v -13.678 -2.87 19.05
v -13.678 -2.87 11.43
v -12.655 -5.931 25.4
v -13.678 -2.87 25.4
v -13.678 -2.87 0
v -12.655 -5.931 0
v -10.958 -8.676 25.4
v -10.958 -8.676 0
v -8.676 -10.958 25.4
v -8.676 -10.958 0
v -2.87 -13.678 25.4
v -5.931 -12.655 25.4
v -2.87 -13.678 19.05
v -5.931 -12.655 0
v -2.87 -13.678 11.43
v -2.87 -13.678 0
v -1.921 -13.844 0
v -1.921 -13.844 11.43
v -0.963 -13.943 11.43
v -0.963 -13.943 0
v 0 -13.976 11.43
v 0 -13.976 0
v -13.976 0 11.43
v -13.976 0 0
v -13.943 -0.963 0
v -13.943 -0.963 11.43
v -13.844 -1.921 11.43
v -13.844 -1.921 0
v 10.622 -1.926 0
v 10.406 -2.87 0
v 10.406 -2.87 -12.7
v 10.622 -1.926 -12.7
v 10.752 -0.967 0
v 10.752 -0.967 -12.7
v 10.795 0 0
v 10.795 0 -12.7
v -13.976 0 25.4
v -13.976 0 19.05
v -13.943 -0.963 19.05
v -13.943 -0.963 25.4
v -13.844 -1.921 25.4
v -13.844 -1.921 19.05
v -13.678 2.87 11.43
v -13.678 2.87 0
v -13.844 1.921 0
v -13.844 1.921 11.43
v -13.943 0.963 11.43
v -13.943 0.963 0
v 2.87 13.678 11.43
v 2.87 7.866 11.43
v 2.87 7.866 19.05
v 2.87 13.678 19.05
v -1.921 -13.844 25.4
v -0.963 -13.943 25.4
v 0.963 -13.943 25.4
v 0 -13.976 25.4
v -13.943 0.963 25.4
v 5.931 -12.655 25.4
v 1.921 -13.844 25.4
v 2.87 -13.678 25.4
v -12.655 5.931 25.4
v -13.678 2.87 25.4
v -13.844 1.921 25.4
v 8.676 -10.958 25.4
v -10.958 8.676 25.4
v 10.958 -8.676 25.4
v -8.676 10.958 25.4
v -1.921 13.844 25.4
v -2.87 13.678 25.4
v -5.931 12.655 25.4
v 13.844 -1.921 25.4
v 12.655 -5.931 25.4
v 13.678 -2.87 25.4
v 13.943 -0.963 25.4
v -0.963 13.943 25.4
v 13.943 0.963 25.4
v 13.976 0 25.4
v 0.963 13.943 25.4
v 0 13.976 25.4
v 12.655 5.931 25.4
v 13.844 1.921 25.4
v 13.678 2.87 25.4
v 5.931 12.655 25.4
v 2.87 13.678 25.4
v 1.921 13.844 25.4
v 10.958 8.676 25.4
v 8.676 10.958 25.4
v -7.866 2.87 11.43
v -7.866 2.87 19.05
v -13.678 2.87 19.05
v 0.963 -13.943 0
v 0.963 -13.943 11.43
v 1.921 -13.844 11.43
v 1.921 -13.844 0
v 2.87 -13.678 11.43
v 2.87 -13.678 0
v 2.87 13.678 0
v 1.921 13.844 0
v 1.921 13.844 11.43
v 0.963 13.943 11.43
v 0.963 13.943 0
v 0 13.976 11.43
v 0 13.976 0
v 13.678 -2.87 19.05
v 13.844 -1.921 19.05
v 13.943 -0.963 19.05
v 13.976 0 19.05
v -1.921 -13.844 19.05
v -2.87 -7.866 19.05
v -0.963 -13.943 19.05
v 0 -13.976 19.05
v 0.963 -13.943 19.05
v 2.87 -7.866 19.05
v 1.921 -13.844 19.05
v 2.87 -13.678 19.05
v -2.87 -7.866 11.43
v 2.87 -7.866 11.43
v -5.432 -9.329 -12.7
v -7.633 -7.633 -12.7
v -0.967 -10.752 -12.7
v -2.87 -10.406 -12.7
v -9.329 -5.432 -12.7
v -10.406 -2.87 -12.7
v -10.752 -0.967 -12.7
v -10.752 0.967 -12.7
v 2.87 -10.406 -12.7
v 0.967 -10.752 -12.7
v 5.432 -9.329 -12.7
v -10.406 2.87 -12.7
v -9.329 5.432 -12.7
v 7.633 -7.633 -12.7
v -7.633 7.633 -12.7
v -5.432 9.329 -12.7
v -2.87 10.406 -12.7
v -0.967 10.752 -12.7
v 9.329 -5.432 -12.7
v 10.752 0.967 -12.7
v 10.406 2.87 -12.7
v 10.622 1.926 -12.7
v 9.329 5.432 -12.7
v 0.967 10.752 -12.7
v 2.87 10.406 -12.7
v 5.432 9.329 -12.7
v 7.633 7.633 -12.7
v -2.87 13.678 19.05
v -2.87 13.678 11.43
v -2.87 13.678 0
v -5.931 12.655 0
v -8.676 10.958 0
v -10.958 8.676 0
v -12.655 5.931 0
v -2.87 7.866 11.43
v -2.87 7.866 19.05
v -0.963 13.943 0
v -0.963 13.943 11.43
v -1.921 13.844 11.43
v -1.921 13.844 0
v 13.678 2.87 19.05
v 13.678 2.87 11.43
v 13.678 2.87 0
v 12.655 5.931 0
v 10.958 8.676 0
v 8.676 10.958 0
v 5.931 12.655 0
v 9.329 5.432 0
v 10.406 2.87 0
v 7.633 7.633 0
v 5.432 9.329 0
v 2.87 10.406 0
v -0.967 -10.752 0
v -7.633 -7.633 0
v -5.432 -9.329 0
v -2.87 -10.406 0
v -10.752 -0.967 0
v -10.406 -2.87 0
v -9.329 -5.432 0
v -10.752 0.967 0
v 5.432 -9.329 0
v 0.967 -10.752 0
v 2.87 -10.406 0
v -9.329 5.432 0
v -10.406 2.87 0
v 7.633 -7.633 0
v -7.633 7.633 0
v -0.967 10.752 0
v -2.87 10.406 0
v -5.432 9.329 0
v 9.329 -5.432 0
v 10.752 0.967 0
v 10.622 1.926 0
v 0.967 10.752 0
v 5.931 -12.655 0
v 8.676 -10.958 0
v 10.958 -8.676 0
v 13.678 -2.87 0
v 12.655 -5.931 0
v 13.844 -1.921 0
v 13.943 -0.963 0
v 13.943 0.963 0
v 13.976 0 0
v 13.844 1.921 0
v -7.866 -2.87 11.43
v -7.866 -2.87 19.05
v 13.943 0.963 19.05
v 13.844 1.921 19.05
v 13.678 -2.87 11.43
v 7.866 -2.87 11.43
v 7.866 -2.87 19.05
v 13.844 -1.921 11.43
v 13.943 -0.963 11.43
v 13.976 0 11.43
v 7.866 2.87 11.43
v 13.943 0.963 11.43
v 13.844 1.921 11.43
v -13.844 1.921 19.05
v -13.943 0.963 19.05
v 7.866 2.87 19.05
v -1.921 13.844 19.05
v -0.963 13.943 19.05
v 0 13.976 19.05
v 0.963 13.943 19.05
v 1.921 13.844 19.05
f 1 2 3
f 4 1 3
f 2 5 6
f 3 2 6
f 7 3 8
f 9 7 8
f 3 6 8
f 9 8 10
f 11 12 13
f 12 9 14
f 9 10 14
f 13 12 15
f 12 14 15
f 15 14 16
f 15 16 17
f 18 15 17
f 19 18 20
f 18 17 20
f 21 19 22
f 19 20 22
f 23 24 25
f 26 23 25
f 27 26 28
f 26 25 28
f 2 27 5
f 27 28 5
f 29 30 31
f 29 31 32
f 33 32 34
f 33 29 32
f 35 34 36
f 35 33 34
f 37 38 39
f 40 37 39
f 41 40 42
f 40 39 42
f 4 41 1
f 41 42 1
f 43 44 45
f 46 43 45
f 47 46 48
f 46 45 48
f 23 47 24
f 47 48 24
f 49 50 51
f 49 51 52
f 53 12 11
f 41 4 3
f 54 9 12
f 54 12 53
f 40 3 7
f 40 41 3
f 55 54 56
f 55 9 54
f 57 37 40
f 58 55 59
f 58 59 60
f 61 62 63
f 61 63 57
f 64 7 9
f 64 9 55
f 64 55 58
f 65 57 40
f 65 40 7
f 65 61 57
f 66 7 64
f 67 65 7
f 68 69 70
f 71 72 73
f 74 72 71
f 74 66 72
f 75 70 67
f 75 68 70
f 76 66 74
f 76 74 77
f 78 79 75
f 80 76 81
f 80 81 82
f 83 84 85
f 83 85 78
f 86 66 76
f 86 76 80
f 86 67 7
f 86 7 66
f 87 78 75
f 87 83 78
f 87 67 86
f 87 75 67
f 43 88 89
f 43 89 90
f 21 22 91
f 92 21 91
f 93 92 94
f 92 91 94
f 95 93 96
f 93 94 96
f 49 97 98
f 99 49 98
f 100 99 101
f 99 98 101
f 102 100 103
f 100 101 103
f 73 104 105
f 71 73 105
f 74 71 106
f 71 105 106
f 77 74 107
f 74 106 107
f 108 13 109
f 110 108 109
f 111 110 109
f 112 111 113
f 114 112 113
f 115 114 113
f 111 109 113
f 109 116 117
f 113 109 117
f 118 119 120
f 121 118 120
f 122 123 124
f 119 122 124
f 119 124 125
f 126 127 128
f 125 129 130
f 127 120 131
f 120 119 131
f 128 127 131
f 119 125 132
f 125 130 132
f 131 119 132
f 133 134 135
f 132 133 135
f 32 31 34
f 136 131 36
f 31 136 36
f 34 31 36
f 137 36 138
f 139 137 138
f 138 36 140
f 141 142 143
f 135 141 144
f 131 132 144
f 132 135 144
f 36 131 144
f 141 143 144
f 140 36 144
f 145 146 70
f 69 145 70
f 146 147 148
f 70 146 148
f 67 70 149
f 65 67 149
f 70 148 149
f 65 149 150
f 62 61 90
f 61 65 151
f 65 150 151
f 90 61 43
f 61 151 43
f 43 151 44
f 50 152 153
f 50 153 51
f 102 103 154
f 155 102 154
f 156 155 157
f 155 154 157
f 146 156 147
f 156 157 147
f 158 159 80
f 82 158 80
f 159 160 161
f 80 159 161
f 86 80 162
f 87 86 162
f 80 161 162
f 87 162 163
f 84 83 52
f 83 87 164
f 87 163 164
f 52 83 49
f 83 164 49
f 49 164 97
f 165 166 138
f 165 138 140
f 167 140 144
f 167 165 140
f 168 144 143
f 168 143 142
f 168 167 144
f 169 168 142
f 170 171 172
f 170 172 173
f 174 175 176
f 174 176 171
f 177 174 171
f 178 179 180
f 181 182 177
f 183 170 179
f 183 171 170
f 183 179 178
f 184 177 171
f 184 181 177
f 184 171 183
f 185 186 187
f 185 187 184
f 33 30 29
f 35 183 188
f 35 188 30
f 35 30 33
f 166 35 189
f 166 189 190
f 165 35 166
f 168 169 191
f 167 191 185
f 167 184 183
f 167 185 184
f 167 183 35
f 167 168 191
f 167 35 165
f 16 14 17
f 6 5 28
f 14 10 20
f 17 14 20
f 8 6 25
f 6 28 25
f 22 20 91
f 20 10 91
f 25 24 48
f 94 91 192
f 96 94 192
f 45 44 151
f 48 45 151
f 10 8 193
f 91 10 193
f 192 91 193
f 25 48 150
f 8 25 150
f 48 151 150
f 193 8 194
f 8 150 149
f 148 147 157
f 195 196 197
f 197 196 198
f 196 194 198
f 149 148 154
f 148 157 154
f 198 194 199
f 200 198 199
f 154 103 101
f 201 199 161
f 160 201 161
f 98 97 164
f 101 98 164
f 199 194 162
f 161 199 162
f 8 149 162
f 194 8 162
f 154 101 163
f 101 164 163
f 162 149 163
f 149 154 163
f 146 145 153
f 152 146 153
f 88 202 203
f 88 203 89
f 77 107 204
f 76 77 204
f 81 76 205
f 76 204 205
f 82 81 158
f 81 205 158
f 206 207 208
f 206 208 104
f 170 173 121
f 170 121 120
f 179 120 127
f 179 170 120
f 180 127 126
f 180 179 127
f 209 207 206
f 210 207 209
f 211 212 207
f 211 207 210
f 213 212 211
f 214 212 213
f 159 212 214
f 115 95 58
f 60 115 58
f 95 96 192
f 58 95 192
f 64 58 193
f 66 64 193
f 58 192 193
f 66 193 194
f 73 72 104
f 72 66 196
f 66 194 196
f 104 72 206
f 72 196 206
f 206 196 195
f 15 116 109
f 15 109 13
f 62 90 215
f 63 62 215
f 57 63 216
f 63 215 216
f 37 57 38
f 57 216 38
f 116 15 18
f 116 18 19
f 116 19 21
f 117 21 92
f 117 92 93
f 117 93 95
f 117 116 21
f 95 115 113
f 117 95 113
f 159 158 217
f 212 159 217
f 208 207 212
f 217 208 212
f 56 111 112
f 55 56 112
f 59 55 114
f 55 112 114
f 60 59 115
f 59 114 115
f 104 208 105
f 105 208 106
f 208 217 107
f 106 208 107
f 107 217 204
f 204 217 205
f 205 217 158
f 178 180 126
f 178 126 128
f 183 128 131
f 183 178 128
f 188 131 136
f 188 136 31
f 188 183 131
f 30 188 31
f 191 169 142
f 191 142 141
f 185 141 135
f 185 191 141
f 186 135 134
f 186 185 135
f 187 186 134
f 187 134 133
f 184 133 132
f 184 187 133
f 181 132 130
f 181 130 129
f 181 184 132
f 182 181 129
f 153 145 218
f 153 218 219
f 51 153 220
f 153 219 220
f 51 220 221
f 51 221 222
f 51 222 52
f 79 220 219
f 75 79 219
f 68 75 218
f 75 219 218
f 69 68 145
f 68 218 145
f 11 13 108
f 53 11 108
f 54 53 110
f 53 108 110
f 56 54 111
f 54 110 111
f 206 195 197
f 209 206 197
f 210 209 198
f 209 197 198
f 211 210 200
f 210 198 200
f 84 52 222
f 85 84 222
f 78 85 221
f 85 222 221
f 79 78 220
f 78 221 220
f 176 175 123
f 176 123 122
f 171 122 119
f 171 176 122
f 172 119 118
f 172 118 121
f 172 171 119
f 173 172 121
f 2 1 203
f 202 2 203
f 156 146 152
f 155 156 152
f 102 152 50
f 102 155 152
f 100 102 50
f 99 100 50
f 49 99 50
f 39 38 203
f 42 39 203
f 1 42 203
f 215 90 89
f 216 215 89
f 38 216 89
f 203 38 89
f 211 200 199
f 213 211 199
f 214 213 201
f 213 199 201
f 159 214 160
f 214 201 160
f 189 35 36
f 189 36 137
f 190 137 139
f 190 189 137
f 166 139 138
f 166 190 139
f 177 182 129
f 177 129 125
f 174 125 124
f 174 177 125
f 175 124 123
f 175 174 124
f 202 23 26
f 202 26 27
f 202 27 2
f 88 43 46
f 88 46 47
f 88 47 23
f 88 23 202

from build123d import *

# Parameters (mm, degrees)
F0_W     = 5.7404
F0_H     = 2.54
F0_W_2   = 2.54
F0_H_2   = 5.7404
F1_DEPTH = 25.4
F2_START = 11.43
F2_DEPTH = 7.62
F3_DEPTH = 12.7


with BuildPart() as f1:
    # F0 (on Top) → F1 (new body)
    with BuildSketch(Plane.XY):
        with BuildLine():
            Line((-2.8702, 10.4064392066), (-2.8702, 13.6784615832))
            ThreePointArc((-2.8702, 13.6784615832), (-9.8827718612, 9.8827718612), (-13.6784615832, 2.8702))
            Line((-13.6784615832, 2.8702), (-10.4064392066, 2.8702))
            ThreePointArc((-10.4064392066, 2.8702), (-7.6332177029, 7.6332177029), (-2.8702, 10.4064392066))
        make_face()
        with BuildLine():
            Line((-2.8702, 10.4064392066), (2.8702, 10.4064392066))
            ThreePointArc((2.8702, 10.4064392066), (0, 10.795), (-2.8702, 10.4064392066))
        make_face()
        with BuildLine():
            Line((2.8702, 10.4064392066), (2.8702, 13.6784615832))
            ThreePointArc((2.8702, 13.6784615832), (1.4428085068, 13.9016784215), (0, 13.97635))
            ThreePointArc((0, 13.97635), (-1.4428085068, 13.9016784215), (-2.8702, 13.6784615832))
            Line((-2.8702, 13.6784615832), (-2.8702, 10.4064392066))
            ThreePointArc((-2.8702, 10.4064392066), (0, 10.795), (2.8702, 10.4064392066))
        make_face()
        with BuildLine():
            Line((10.4064392066, 2.8702), (13.6784615832, 2.8702))
            ThreePointArc((13.6784615832, 2.8702), (9.8827718612, 9.8827718612), (2.8702, 13.6784615832))
            Line((2.8702, 13.6784615832), (2.8702, 10.4064392066))
            ThreePointArc((2.8702, 10.4064392066), (7.6332177029, 7.6332177029), (10.4064392066, 2.8702))
        make_face()
        with BuildLine():
            ThreePointArc((13.6784615832, -2.8702), (13.9016784215, -1.4428085068), (13.97635, 0))
            ThreePointArc((13.97635, 0), (13.9016784215, 1.4428085068), (13.6784615832, 2.8702))
            Line((13.6784615832, 2.8702), (10.4064392066, 2.8702))
            ThreePointArc((10.4064392066, 2.8702), (10.6974187596, 1.4481908999), (10.795, 0))
            ThreePointArc((10.795, 0), (10.6974187596, -1.4481908999), (10.4064392066, -2.8702))
            Line((10.4064392066, -2.8702), (13.6784615832, -2.8702))
        make_face()
        with Locations((0, 9.1364392066)):
            Rectangle(F0_W, F0_H)
        with BuildLine():
            ThreePointArc((10.795, 0), (10.6974187596, 1.4481908999), (10.4064392066, 2.8702))
            Line((10.4064392066, 2.8702), (10.4064392066, -2.8702))
            ThreePointArc((10.4064392066, -2.8702), (10.6974187596, -1.4481908999), (10.795, 0))
        make_face()
        with BuildLine():
            ThreePointArc((2.8702, -13.6784615832), (9.8827718612, -9.8827718612), (13.6784615832, -2.8702))
            Line((13.6784615832, -2.8702), (10.4064392066, -2.8702))
            ThreePointArc((10.4064392066, -2.8702), (7.6332177029, -7.6332177029), (2.8702, -10.4064392066))
            Line((2.8702, -10.4064392066), (2.8702, -13.6784615832))
        make_face()
        with BuildLine():
            ThreePointArc((-13.6784615832, -2.8702), (-9.8827718612, -9.8827718612), (-2.8702, -13.6784615832))
            Line((-2.8702, -13.6784615832), (-2.8702, -10.4064392066))
            ThreePointArc((-2.8702, -10.4064392066), (-7.6332177029, -7.6332177029), (-10.4064392066, -2.8702))
            Line((-10.4064392066, -2.8702), (-13.6784615832, -2.8702))
        make_face()
        with BuildLine():
            Line((-10.4064392066, 2.8702), (-13.6784615832, 2.8702))
            ThreePointArc((-13.6784615832, 2.8702), (-13.9016784215, 1.4428085068), (-13.97635, 0))
            ThreePointArc((-13.97635, 0), (-13.9016784215, -1.4428085068), (-13.6784615832, -2.8702))
            Line((-13.6784615832, -2.8702), (-10.4064392066, -2.8702))
            ThreePointArc((-10.4064392066, -2.8702), (-10.795, 0), (-10.4064392066, 2.8702))
        make_face()
        with BuildLine():
            Line((-10.4064392066, -2.8702), (-10.4064392066, 2.8702))
            ThreePointArc((-10.4064392066, 2.8702), (-10.795, 0), (-10.4064392066, -2.8702))
        make_face()
        with BuildLine():
            ThreePointArc((0, -13.97635), (1.4428085068, -13.9016784215), (2.8702, -13.6784615832))
            Line((2.8702, -13.6784615832), (2.8702, -10.4064392066))
            ThreePointArc((2.8702, -10.4064392066), (0, -10.795), (-2.8702, -10.4064392066))
            Line((-2.8702, -10.4064392066), (-2.8702, -13.6784615832))
            ThreePointArc((-2.8702, -13.6784615832), (-1.4428085068, -13.9016784215), (0, -13.97635))
        make_face()
        with BuildLine():
            ThreePointArc((-2.8702, -10.4064392066), (0, -10.795), (2.8702, -10.4064392066))
            Line((2.8702, -10.4064392066), (-2.8702, -10.4064392066))
        make_face()
        with Locations((-9.1364392066, 0)):
            Rectangle(F0_W_2, F0_H_2)
        with BuildLine():
            Line((7.8664392066, 2.8702), (10.4064392066, 2.8702))
            ThreePointArc((10.4064392066, 2.8702), (7.6332177029, 7.6332177029), (2.8702, 10.4064392066))
            Line((2.8702, 10.4064392066), (2.8702, 7.8664392066))
            Line((2.8702, 7.8664392066), (-2.8702, 7.8664392066))
            Line((-2.8702, 7.8664392066), (-2.8702, 10.4064392066))
            ThreePointArc((-2.8702, 10.4064392066), (-7.6332177029, 7.6332177029), (-10.4064392066, 2.8702))
            Line((-10.4064392066, 2.8702), (-7.8664392066, 2.8702))
            Line((-7.8664392066, 2.8702), (-7.8664392066, -2.8702))
            Line((-7.8664392066, -2.8702), (-10.4064392066, -2.8702))
            ThreePointArc((-10.4064392066, -2.8702), (-7.6332177029, -7.6332177029), (-2.8702, -10.4064392066))
            Line((-2.8702, -10.4064392066), (-2.8702, -7.8664392066))
            Line((-2.8702, -7.8664392066), (2.8702, -7.8664392066))
            Line((2.8702, -7.8664392066), (2.8702, -10.4064392066))
            ThreePointArc((2.8702, -10.4064392066), (7.6332177029, -7.6332177029), (10.4064392066, -2.8702))
            Line((10.4064392066, -2.8702), (7.8664392066, -2.8702))
            Line((7.8664392066, -2.8702), (7.8664392066, 2.8702))
        make_face()
        with Locations((9.1364392066, 0)):
            Rectangle(F0_W_2, F0_H_2)
        with Locations((0, -9.1364392066)):
            Rectangle(F0_W, F0_H)
    extrude(amount=F1_DEPTH)

    # F0 (on Top) → F2 (cut)
    with BuildSketch(Plane.XY.offset(F2_START)):
        with BuildLine():
            Line((-10.4064392066, 2.8702), (-13.6784615832, 2.8702))
            ThreePointArc((-13.6784615832, 2.8702), (-13.9016784215, 1.4428085068), (-13.97635, 0))
            ThreePointArc((-13.97635, 0), (-13.9016784215, -1.4428085068), (-13.6784615832, -2.8702))
            Line((-13.6784615832, -2.8702), (-10.4064392066, -2.8702))
            ThreePointArc((-10.4064392066, -2.8702), (-10.795, 0), (-10.4064392066, 2.8702))
        make_face()
        with BuildLine():
            Line((-10.4064392066, -2.8702), (-10.4064392066, 2.8702))
            ThreePointArc((-10.4064392066, 2.8702), (-10.795, 0), (-10.4064392066, -2.8702))
        make_face()
        with BuildLine():
            ThreePointArc((0, -13.97635), (1.4428085068, -13.9016784215), (2.8702, -13.6784615832))
            Line((2.8702, -13.6784615832), (2.8702, -10.4064392066))
            ThreePointArc((2.8702, -10.4064392066), (0, -10.795), (-2.8702, -10.4064392066))
            Line((-2.8702, -10.4064392066), (-2.8702, -13.6784615832))
            ThreePointArc((-2.8702, -13.6784615832), (-1.4428085068, -13.9016784215), (0, -13.97635))
        make_face()
        with BuildLine():
            ThreePointArc((-2.8702, -10.4064392066), (0, -10.795), (2.8702, -10.4064392066))
            Line((2.8702, -10.4064392066), (-2.8702, -10.4064392066))
        make_face()
        with BuildLine():
            Line((2.8702, 10.4064392066), (2.8702, 13.6784615832))
            ThreePointArc((2.8702, 13.6784615832), (1.4428085068, 13.9016784215), (0, 13.97635))
            ThreePointArc((0, 13.97635), (-1.4428085068, 13.9016784215), (-2.8702, 13.6784615832))
            Line((-2.8702, 13.6784615832), (-2.8702, 10.4064392066))
            ThreePointArc((-2.8702, 10.4064392066), (0, 10.795), (2.8702, 10.4064392066))
        make_face()
        with BuildLine():
            Line((-2.8702, 10.4064392066), (2.8702, 10.4064392066))
            ThreePointArc((2.8702, 10.4064392066), (0, 10.795), (-2.8702, 10.4064392066))
        make_face()
        with BuildLine():
            ThreePointArc((10.795, 0), (10.6974187596, 1.4481908999), (10.4064392066, 2.8702))
            Line((10.4064392066, 2.8702), (10.4064392066, -2.8702))
            ThreePointArc((10.4064392066, -2.8702), (10.6974187596, -1.4481908999), (10.795, 0))
        make_face()
        with BuildLine():
            ThreePointArc((13.6784615832, -2.8702), (13.9016784215, -1.4428085068), (13.97635, 0))
            ThreePointArc((13.97635, 0), (13.9016784215, 1.4428085068), (13.6784615832, 2.8702))
            Line((13.6784615832, 2.8702), (10.4064392066, 2.8702))
            ThreePointArc((10.4064392066, 2.8702), (10.6974187596, 1.4481908999), (10.795, 0))
            ThreePointArc((10.795, 0), (10.6974187596, -1.4481908999), (10.4064392066, -2.8702))
            Line((10.4064392066, -2.8702), (13.6784615832, -2.8702))
        make_face()
        with Locations((-9.1364392066, 0)):
            Rectangle(F0_W_2, F0_H_2)
        with Locations((0, 9.1364392066)):
            Rectangle(F0_W, F0_H)
        with Locations((9.1364392066, 0)):
            Rectangle(F0_W_2, F0_H_2)
        with Locations((0, -9.1364392066)):
            Rectangle(F0_W, F0_H)
    extrude(amount=F2_DEPTH, mode=Mode.SUBTRACT)


with BuildPart() as f3:
    # F0 (on Top) → F3 (new body)
    with BuildSketch(Plane.XY):
        with Locations((0, 9.1364392066)):
            Rectangle(F0_W, F0_H)
        with BuildLine():
            Line((-10.4064392066, -2.8702), (-10.4064392066, 2.8702))
            ThreePointArc((-10.4064392066, 2.8702), (-10.795, 0), (-10.4064392066, -2.8702))
        make_face()
        with BuildLine():
            ThreePointArc((-2.8702, -10.4064392066), (0, -10.795), (2.8702, -10.4064392066))
            Line((2.8702, -10.4064392066), (-2.8702, -10.4064392066))
        make_face()
        with BuildLine():
            Line((-2.8702, 10.4064392066), (2.8702, 10.4064392066))
            ThreePointArc((2.8702, 10.4064392066), (0, 10.795), (-2.8702, 10.4064392066))
        make_face()
        with BuildLine():
            ThreePointArc((10.795, 0), (10.6974187596, 1.4481908999), (10.4064392066, 2.8702))
            Line((10.4064392066, 2.8702), (10.4064392066, -2.8702))
            ThreePointArc((10.4064392066, -2.8702), (10.6974187596, -1.4481908999), (10.795, 0))
        make_face()
        with BuildLine():
            Line((7.8664392066, 2.8702), (10.4064392066, 2.8702))
            ThreePointArc((10.4064392066, 2.8702), (7.6332177029, 7.6332177029), (2.8702, 10.4064392066))
            Line((2.8702, 10.4064392066), (2.8702, 7.8664392066))
            Line((2.8702, 7.8664392066), (-2.8702, 7.8664392066))
            Line((-2.8702, 7.8664392066), (-2.8702, 10.4064392066))
            ThreePointArc((-2.8702, 10.4064392066), (-7.6332177029, 7.6332177029), (-10.4064392066, 2.8702))
            Line((-10.4064392066, 2.8702), (-7.8664392066, 2.8702))
            Line((-7.8664392066, 2.8702), (-7.8664392066, -2.8702))
            Line((-7.8664392066, -2.8702), (-10.4064392066, -2.8702))
            ThreePointArc((-10.4064392066, -2.8702), (-7.6332177029, -7.6332177029), (-2.8702, -10.4064392066))
            Line((-2.8702, -10.4064392066), (-2.8702, -7.8664392066))
            Line((-2.8702, -7.8664392066), (2.8702, -7.8664392066))
            Line((2.8702, -7.8664392066), (2.8702, -10.4064392066))
            ThreePointArc((2.8702, -10.4064392066), (7.6332177029, -7.6332177029), (10.4064392066, -2.8702))
            Line((10.4064392066, -2.8702), (7.8664392066, -2.8702))
            Line((7.8664392066, -2.8702), (7.8664392066, 2.8702))
        make_face()
        with Locations((0, -9.1364392066)):
            Rectangle(F0_W, F0_H)
        with Locations((-9.1364392066, 0)):
            Rectangle(F0_W_2, F0_H_2)
        with Locations((9.1364392066, 0)):
            Rectangle(F0_W_2, F0_H_2)
    extrude(amount=-F3_DEPTH)


solid = Compound([f1.part, f3.part])
